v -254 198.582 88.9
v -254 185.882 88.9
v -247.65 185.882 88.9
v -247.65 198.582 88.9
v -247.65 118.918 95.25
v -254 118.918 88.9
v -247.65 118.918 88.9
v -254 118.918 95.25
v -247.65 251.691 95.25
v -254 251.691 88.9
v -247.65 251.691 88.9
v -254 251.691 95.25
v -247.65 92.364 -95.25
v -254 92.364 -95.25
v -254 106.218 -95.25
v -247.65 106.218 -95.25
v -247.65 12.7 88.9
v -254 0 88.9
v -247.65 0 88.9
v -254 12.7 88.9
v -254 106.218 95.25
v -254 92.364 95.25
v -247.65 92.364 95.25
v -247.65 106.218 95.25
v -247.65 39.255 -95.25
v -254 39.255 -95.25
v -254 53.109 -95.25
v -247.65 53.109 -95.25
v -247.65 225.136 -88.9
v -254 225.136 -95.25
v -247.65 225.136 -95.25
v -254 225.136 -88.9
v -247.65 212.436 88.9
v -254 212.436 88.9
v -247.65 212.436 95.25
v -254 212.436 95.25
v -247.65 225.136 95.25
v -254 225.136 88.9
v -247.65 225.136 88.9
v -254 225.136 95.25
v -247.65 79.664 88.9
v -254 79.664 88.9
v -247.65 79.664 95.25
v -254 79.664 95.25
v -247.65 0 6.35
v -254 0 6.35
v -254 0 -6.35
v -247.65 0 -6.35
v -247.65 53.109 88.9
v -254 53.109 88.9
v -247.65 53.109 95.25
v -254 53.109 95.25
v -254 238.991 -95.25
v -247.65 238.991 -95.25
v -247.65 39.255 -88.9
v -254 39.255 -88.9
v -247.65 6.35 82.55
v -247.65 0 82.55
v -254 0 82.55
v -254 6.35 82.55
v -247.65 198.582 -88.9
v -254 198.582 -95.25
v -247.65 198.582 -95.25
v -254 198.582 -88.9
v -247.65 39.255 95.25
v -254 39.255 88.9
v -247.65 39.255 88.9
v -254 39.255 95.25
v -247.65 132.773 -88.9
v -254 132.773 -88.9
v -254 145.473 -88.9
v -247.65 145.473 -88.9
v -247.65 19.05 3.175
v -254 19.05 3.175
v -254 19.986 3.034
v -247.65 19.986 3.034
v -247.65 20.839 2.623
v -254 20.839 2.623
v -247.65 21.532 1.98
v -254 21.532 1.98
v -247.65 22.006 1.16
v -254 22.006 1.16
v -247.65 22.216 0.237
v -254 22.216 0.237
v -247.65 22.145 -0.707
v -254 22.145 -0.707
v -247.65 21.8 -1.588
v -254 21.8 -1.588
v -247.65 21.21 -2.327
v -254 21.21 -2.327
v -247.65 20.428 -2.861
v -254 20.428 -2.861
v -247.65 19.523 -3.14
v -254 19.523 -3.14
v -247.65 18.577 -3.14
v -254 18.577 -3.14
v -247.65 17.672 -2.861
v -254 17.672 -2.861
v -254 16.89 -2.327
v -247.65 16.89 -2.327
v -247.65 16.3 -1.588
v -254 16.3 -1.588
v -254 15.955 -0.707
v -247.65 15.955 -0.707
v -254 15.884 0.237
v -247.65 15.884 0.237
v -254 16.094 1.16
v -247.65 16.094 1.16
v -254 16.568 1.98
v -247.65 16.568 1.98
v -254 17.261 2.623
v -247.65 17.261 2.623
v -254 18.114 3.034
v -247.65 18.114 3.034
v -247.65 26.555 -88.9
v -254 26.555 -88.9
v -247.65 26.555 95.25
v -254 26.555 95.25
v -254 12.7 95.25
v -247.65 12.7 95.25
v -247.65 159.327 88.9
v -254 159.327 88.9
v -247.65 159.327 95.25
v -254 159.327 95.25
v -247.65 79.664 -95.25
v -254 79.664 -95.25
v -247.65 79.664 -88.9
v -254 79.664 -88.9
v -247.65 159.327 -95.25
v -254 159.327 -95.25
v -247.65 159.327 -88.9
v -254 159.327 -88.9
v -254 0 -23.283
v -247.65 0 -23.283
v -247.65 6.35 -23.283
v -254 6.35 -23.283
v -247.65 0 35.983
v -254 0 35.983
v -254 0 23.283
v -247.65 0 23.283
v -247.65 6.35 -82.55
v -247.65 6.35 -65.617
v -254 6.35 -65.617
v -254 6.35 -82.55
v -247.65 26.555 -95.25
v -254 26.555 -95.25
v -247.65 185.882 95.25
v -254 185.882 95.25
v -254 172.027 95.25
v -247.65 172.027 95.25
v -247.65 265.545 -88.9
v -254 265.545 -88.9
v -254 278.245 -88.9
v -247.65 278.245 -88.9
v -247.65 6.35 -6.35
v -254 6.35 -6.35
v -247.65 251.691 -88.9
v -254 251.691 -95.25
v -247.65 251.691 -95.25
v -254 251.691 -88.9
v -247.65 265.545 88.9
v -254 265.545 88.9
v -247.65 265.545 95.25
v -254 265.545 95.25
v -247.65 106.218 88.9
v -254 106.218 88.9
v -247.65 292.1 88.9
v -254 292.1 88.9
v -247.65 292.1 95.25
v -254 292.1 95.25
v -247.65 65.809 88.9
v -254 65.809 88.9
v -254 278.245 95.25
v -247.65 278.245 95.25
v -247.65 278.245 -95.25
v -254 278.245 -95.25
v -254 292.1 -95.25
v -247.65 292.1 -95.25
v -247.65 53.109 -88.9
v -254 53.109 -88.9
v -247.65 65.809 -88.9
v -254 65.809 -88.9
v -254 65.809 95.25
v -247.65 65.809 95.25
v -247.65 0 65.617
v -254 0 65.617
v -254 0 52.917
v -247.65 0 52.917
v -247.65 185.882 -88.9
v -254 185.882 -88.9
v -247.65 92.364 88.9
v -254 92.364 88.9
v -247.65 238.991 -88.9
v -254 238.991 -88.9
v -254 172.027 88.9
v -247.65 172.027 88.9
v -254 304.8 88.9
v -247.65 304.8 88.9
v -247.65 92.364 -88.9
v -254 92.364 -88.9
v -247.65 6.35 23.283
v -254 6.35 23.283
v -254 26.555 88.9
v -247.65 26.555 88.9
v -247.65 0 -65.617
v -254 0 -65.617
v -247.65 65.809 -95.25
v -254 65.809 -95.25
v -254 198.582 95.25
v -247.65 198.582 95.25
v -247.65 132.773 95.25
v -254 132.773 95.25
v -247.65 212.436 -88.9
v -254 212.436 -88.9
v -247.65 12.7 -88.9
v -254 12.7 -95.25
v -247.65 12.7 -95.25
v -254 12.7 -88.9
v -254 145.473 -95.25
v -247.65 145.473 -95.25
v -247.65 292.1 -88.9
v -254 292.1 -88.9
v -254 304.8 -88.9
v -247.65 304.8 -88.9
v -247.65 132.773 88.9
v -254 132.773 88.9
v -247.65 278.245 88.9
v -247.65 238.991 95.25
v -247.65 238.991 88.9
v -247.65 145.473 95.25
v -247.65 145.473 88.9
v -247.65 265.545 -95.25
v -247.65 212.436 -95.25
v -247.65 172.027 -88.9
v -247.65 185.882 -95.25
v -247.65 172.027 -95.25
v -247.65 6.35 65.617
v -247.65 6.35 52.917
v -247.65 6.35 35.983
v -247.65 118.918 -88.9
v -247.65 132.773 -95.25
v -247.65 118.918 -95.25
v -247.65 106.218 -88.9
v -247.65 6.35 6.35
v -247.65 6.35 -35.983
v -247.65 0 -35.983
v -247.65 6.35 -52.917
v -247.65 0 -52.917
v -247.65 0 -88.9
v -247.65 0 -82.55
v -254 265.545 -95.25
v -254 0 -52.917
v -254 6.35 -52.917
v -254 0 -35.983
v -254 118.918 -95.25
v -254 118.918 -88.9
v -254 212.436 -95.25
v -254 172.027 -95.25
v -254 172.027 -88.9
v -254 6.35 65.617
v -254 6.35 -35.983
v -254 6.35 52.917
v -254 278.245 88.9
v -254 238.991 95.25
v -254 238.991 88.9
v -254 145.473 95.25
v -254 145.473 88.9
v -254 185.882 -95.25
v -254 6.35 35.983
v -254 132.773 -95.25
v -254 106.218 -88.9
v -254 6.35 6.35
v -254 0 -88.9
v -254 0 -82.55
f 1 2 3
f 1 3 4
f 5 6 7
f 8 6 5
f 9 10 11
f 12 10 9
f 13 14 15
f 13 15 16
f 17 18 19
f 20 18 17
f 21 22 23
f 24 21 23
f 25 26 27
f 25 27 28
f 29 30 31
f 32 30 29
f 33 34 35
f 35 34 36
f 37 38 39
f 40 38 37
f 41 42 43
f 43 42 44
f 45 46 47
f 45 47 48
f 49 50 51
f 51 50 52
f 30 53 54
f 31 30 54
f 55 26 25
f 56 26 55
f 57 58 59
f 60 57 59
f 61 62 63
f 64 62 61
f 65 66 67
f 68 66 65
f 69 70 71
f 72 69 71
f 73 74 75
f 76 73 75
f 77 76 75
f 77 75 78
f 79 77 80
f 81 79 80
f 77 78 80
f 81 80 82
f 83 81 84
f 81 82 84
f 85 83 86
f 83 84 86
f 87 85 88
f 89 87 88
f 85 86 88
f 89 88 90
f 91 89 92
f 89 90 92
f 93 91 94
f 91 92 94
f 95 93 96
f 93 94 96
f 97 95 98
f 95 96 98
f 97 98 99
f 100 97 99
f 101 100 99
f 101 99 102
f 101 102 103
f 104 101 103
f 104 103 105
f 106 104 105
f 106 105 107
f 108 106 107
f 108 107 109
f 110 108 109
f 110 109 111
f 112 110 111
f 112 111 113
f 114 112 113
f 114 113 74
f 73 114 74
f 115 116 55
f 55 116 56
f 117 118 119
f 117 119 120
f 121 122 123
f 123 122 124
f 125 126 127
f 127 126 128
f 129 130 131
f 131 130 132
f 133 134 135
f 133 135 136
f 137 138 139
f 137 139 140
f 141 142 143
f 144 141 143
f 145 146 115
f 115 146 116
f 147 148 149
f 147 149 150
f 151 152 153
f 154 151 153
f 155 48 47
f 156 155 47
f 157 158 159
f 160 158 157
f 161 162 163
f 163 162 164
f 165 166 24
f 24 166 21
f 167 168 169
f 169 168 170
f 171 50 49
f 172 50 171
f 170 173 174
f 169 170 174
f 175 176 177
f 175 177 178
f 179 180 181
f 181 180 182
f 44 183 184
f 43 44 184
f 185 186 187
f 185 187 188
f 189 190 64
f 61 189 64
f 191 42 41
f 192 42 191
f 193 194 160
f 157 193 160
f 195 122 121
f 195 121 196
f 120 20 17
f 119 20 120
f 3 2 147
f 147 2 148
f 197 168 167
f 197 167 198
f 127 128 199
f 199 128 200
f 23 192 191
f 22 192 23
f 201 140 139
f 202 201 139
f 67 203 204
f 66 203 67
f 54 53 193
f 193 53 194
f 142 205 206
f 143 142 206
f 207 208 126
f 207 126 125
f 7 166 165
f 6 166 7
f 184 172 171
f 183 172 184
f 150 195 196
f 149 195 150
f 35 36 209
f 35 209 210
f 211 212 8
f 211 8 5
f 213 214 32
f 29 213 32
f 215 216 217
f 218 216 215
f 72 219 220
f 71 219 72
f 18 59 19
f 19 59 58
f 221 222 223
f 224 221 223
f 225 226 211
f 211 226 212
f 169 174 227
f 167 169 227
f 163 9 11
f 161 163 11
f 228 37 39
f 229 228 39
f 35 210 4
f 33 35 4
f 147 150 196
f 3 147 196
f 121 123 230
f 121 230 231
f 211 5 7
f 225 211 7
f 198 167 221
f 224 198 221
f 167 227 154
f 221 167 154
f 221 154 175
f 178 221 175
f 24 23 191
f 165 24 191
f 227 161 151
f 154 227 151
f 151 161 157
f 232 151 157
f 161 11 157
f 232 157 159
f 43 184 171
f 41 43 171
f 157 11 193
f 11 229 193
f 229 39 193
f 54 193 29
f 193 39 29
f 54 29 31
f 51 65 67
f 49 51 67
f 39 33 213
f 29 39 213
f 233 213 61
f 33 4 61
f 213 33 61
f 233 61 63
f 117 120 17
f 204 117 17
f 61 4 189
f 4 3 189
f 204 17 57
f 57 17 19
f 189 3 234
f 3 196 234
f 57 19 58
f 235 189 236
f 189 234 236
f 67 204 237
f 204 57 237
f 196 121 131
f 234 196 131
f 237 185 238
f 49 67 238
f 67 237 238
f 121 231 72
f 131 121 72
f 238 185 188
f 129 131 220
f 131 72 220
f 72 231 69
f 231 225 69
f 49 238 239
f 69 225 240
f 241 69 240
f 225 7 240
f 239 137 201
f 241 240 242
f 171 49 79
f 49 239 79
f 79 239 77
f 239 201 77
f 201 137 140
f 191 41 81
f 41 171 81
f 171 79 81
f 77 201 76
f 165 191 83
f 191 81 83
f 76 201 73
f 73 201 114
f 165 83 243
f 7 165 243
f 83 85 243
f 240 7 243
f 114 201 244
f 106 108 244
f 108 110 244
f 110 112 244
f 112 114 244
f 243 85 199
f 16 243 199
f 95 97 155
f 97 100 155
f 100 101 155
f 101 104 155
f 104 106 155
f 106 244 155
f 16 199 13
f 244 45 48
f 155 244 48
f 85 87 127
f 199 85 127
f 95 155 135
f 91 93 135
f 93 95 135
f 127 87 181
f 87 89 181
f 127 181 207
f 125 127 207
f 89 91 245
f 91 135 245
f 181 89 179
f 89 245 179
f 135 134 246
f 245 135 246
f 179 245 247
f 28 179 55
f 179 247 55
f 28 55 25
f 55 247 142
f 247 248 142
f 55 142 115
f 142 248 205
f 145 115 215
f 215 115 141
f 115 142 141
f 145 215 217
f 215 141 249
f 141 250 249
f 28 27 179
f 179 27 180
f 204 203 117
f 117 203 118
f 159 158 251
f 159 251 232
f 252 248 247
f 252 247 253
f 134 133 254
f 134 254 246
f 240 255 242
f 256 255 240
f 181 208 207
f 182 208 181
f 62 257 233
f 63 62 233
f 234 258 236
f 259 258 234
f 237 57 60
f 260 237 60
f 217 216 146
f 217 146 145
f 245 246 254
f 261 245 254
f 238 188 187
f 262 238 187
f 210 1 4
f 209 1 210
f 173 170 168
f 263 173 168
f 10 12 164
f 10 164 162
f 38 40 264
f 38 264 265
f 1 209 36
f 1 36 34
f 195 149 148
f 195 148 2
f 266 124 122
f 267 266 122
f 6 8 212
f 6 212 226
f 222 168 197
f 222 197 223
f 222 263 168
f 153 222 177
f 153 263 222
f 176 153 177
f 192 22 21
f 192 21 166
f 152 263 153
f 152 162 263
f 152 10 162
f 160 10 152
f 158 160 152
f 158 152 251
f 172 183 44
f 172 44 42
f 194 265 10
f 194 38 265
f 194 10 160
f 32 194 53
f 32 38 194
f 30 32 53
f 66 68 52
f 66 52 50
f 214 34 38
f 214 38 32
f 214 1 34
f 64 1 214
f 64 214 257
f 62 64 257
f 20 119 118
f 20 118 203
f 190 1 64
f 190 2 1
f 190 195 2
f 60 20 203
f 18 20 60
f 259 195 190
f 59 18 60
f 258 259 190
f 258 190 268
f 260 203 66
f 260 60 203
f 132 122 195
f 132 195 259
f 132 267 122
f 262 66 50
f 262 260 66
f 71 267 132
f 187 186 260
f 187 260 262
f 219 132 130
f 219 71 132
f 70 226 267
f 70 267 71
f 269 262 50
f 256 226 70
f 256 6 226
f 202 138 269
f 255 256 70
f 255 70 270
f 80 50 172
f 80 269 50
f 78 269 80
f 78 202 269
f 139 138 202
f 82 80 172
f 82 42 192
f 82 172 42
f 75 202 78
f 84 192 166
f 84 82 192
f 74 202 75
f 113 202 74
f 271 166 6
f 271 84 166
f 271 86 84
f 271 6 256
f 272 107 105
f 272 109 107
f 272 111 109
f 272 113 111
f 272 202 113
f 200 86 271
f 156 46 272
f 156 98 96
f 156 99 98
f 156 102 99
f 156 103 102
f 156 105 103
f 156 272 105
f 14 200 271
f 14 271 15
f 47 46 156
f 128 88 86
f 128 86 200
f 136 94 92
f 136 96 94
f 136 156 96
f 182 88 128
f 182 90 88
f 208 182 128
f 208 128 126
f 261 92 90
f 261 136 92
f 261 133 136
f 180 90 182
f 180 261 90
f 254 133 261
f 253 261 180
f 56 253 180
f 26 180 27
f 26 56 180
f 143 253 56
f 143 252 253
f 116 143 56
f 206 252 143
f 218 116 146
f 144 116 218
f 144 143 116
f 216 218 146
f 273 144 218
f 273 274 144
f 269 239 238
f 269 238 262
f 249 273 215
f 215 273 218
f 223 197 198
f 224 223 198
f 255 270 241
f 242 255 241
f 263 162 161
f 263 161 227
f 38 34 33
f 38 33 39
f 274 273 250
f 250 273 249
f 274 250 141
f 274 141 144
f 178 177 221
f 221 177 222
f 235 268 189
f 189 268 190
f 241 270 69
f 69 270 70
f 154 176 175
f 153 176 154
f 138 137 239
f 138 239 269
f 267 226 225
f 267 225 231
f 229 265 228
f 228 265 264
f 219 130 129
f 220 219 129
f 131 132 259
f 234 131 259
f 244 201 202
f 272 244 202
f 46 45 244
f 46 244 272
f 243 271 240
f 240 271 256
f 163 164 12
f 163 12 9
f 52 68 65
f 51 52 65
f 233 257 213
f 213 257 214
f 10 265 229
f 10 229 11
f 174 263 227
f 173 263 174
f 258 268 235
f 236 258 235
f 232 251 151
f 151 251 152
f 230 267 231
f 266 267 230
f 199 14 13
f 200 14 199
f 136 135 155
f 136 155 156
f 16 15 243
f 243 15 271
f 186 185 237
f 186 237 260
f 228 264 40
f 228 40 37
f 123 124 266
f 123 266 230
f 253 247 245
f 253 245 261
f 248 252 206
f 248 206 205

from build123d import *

# Parameters (mm, degrees)
SKETCH1_W           = 508
SKETCH1_H           = 190.5
BOSS_EXTRUDE1_DEPTH = 6.35
SKETCH2_W           = 508
SKETCH2_H           = 190.5
SKETCH2_W_2         = 495.3
SKETCH2_H_2         = 177.8
BOSS_EXTRUDE2_DEPTH = 298.45
SKETCH3_W           = 6.35
SKETCH3_H           = 16.933333333
SKETCH3_H_2         = 16.933333334
CUT_EXTRUDE1_DEPTH  = 12.7
SKETCH4_W           = 6.35
SKETCH4_H           = 15.875
CUT_EXTRUDE2_DEPTH  = 6.35
SKETCH6_W           = 514.801062296
SKETCH6_H           = 254.881465808
CUT_EXTRUDE5_DEPTH  = 305.8
SKETCH5_W           = 6.35
SKETCH5_H           = 16.933333333
SKETCH5_H_2         = 16.933333334
CUT_EXTRUDE6_DEPTH  = 6.35
SKETCH7_W           = 6.35
SKETCH7_H           = 12.7
CUT_EXTRUDE7_DEPTH  = 7.35
SKETCH8_R           = 3.175
CUT_EXTRUDE8_DEPTH  = 7.35


with BuildPart() as part:
    # Sketch1 → Boss-Extrude1 (new body)
    with BuildSketch(Plane(origin=(0, 0, 0), x_dir=(1, 0, 0), z_dir=(0, 1, 0))):
        Rectangle(SKETCH1_W, SKETCH1_H)
    extrude(amount=BOSS_EXTRUDE1_DEPTH)

    # Sketch2 → Boss-Extrude2 (add)
    with BuildSketch(Plane(origin=(0, 6.35, 0), x_dir=(1, 0, 0), z_dir=(0, 1, 0))):
        Rectangle(SKETCH2_W, SKETCH2_H)
        Rectangle(SKETCH2_W_2, SKETCH2_H_2, mode=Mode.SUBTRACT)
    extrude(amount=BOSS_EXTRUDE2_DEPTH)

    # Sketch3 → Cut-Extrude1 (cut)
    with BuildSketch(Plane.XY.offset(95.25)):
        with BuildLine():
            Line((-3.302, 283.21), (-3.302, 6.35))
            Line((-3.302, 6.35), (3.302, 6.35))
            Line((3.302, 6.35), (3.302, 292.354))
            Line((3.302, 292.354), (-16.256, 292.354))
            Line((-16.256, 292.354), (-16.256, 285.75))
            Line((-16.256, 285.75), (-5.842, 285.75))
            ThreePointArc((-5.842, 285.75), (-4.045948776, 285.006051224), (-3.302, 283.21))
        make_face()
        with Locations((12.827, 80.433333334)):
            Rectangle(SKETCH3_W, SKETCH3_H)
        with Locations((12.827, 50.8)):
            Rectangle(SKETCH3_W, SKETCH3_H_2)
        with Locations((12.827, 21.166666667)):
            Rectangle(SKETCH3_W, SKETCH3_H)
    extrude(amount=-CUT_EXTRUDE1_DEPTH, mode=Mode.SUBTRACT)

    # Sketch4 → Cut-Extrude2 (cut)
    with BuildSketch(Plane.XY.offset(-88.9)):
        with Locations((-19.431, 284.1625)):
            Rectangle(SKETCH4_W, SKETCH4_H)
        with Locations((-19.431, 255.5875)):
            Rectangle(SKETCH4_W, SKETCH4_H)
        with Locations((-19.431, 227.0125)):
            Rectangle(SKETCH4_W, SKETCH4_H)
        with Locations((-19.431, 198.4375)):
            Rectangle(SKETCH4_W, SKETCH4_H)
        with Locations((-19.431, 169.8625)):
            Rectangle(SKETCH4_W, SKETCH4_H)
        with Locations((-19.431, 141.2875)):
            Rectangle(SKETCH4_W, SKETCH4_H)
        with Locations((-19.431, 112.7125)):
            Rectangle(SKETCH4_W, SKETCH4_H)
        with Locations((-19.431, 84.1375)):
            Rectangle(SKETCH4_W, SKETCH4_H)
        with Locations((-19.431, 55.5625)):
            Rectangle(SKETCH4_W, SKETCH4_H)
        with Locations((-19.431, 26.9875)):
            Rectangle(SKETCH4_W, SKETCH4_H)
    cut_extrude2 = extrude(amount=-CUT_EXTRUDE2_DEPTH, mode=Mode.SUBTRACT)

    # Mirror1: Cut-Extrude2 across plane
    add(cut_extrude2.mirror(Plane.ZY.offset(6.477)), mode=Mode.SUBTRACT)

    # Sketch6 → Cut-Extrude5 (cut, through all)
    with BuildSketch(Plane(origin=(0, 0, 0), x_dir=(1, 0, 0), z_dir=(0, 1, 0))):
        with Locations((9.750531148, -10.000845247)):
            Rectangle(SKETCH6_W, SKETCH6_H)
    extrude(amount=CUT_EXTRUDE5_DEPTH, mode=Mode.SUBTRACT)

    # Sketch5 → Cut-Extrude6 (cut)
    with BuildSketch(Plane(origin=(0, 0, 0), x_dir=(-1, 0, 0), z_dir=(0, -1, 0))):
        with Locations((250.825, -74.083333334)):
            Rectangle(SKETCH5_W, SKETCH5_H)
        with Locations((250.825, -44.45)):
            Rectangle(SKETCH5_W, SKETCH5_H_2)
        with Locations((250.825, -14.816666667)):
            Rectangle(SKETCH5_W, SKETCH5_H)
        with Locations((250.825, 14.816666667)):
            Rectangle(SKETCH5_W, SKETCH5_H)
        with Locations((250.825, 44.45)):
            Rectangle(SKETCH5_W, SKETCH5_H_2)
        with Locations((250.825, 74.083333334)):
            Rectangle(SKETCH5_W, SKETCH5_H)
    extrude(amount=-CUT_EXTRUDE6_DEPTH, mode=Mode.SUBTRACT)

    # Sketch7 → Cut-Extrude7 (cut, through all)
    with BuildSketch(Plane.ZY.offset(254)):
        with Locations((-92.075, 32.904545455)):
            Rectangle(SKETCH7_W, SKETCH7_H)
        with Locations((-92.075, 6.35)):
            Rectangle(SKETCH7_W, SKETCH7_H)
        with Locations((-92.075, 59.459090909)):
            Rectangle(SKETCH7_W, SKETCH7_H)
        with Locations((-92.075, 86.013636364)):
            Rectangle(SKETCH7_W, SKETCH7_H)
        with Locations((-92.075, 112.568181818)):
            Rectangle(SKETCH7_W, SKETCH7_H)
        with Locations((-92.075, 139.122727273)):
            Rectangle(SKETCH7_W, SKETCH7_H)
        with Locations((-92.075, 165.677272727)):
            Rectangle(SKETCH7_W, SKETCH7_H)
        with Locations((-92.075, 192.231818182)):
            Rectangle(SKETCH7_W, SKETCH7_H)
        with Locations((-92.075, 218.786363636)):
            Rectangle(SKETCH7_W, SKETCH7_H)
        with Locations((-92.075, 245.340909091)):
            Rectangle(SKETCH7_W, SKETCH7_H)
        with Locations((-92.075, 271.895454545)):
            Rectangle(SKETCH7_W, SKETCH7_H)
        with Locations((-92.075, 298.45)):
            Rectangle(SKETCH7_W, SKETCH7_H)
        with Locations((92.075, 298.45)):
            Rectangle(SKETCH7_W, SKETCH7_H)
        with Locations((92.075, 271.895454545)):
            Rectangle(SKETCH7_W, SKETCH7_H)
        with Locations((92.075, 245.340909091)):
            Rectangle(SKETCH7_W, SKETCH7_H)
        with Locations((92.075, 218.786363636)):
            Rectangle(SKETCH7_W, SKETCH7_H)
        with Locations((92.075, 192.231818182)):
            Rectangle(SKETCH7_W, SKETCH7_H)
        with Locations((92.075, 165.677272727)):
            Rectangle(SKETCH7_W, SKETCH7_H)
        with Locations((92.075, 139.122727273)):
            Rectangle(SKETCH7_W, SKETCH7_H)
        with Locations((92.075, 112.568181818)):
            Rectangle(SKETCH7_W, SKETCH7_H)
        with Locations((92.075, 86.013636364)):
            Rectangle(SKETCH7_W, SKETCH7_H)
        with Locations((92.075, 59.459090909)):
            Rectangle(SKETCH7_W, SKETCH7_H)
        with Locations((92.075, 32.904545455)):
            Rectangle(SKETCH7_W, SKETCH7_H)
        with Locations((92.075, 6.35)):
            Rectangle(SKETCH7_W, SKETCH7_H)
    extrude(amount=-CUT_EXTRUDE7_DEPTH, mode=Mode.SUBTRACT)

    # Sketch8 → Cut-Extrude8 (cut, through all)
    with BuildSketch(Plane.ZY.offset(254)):
        with Locations((0, 19.05)):
            Circle(SKETCH8_R)
    extrude(amount=-CUT_EXTRUDE8_DEPTH, mode=Mode.SUBTRACT)


solid = part.part
